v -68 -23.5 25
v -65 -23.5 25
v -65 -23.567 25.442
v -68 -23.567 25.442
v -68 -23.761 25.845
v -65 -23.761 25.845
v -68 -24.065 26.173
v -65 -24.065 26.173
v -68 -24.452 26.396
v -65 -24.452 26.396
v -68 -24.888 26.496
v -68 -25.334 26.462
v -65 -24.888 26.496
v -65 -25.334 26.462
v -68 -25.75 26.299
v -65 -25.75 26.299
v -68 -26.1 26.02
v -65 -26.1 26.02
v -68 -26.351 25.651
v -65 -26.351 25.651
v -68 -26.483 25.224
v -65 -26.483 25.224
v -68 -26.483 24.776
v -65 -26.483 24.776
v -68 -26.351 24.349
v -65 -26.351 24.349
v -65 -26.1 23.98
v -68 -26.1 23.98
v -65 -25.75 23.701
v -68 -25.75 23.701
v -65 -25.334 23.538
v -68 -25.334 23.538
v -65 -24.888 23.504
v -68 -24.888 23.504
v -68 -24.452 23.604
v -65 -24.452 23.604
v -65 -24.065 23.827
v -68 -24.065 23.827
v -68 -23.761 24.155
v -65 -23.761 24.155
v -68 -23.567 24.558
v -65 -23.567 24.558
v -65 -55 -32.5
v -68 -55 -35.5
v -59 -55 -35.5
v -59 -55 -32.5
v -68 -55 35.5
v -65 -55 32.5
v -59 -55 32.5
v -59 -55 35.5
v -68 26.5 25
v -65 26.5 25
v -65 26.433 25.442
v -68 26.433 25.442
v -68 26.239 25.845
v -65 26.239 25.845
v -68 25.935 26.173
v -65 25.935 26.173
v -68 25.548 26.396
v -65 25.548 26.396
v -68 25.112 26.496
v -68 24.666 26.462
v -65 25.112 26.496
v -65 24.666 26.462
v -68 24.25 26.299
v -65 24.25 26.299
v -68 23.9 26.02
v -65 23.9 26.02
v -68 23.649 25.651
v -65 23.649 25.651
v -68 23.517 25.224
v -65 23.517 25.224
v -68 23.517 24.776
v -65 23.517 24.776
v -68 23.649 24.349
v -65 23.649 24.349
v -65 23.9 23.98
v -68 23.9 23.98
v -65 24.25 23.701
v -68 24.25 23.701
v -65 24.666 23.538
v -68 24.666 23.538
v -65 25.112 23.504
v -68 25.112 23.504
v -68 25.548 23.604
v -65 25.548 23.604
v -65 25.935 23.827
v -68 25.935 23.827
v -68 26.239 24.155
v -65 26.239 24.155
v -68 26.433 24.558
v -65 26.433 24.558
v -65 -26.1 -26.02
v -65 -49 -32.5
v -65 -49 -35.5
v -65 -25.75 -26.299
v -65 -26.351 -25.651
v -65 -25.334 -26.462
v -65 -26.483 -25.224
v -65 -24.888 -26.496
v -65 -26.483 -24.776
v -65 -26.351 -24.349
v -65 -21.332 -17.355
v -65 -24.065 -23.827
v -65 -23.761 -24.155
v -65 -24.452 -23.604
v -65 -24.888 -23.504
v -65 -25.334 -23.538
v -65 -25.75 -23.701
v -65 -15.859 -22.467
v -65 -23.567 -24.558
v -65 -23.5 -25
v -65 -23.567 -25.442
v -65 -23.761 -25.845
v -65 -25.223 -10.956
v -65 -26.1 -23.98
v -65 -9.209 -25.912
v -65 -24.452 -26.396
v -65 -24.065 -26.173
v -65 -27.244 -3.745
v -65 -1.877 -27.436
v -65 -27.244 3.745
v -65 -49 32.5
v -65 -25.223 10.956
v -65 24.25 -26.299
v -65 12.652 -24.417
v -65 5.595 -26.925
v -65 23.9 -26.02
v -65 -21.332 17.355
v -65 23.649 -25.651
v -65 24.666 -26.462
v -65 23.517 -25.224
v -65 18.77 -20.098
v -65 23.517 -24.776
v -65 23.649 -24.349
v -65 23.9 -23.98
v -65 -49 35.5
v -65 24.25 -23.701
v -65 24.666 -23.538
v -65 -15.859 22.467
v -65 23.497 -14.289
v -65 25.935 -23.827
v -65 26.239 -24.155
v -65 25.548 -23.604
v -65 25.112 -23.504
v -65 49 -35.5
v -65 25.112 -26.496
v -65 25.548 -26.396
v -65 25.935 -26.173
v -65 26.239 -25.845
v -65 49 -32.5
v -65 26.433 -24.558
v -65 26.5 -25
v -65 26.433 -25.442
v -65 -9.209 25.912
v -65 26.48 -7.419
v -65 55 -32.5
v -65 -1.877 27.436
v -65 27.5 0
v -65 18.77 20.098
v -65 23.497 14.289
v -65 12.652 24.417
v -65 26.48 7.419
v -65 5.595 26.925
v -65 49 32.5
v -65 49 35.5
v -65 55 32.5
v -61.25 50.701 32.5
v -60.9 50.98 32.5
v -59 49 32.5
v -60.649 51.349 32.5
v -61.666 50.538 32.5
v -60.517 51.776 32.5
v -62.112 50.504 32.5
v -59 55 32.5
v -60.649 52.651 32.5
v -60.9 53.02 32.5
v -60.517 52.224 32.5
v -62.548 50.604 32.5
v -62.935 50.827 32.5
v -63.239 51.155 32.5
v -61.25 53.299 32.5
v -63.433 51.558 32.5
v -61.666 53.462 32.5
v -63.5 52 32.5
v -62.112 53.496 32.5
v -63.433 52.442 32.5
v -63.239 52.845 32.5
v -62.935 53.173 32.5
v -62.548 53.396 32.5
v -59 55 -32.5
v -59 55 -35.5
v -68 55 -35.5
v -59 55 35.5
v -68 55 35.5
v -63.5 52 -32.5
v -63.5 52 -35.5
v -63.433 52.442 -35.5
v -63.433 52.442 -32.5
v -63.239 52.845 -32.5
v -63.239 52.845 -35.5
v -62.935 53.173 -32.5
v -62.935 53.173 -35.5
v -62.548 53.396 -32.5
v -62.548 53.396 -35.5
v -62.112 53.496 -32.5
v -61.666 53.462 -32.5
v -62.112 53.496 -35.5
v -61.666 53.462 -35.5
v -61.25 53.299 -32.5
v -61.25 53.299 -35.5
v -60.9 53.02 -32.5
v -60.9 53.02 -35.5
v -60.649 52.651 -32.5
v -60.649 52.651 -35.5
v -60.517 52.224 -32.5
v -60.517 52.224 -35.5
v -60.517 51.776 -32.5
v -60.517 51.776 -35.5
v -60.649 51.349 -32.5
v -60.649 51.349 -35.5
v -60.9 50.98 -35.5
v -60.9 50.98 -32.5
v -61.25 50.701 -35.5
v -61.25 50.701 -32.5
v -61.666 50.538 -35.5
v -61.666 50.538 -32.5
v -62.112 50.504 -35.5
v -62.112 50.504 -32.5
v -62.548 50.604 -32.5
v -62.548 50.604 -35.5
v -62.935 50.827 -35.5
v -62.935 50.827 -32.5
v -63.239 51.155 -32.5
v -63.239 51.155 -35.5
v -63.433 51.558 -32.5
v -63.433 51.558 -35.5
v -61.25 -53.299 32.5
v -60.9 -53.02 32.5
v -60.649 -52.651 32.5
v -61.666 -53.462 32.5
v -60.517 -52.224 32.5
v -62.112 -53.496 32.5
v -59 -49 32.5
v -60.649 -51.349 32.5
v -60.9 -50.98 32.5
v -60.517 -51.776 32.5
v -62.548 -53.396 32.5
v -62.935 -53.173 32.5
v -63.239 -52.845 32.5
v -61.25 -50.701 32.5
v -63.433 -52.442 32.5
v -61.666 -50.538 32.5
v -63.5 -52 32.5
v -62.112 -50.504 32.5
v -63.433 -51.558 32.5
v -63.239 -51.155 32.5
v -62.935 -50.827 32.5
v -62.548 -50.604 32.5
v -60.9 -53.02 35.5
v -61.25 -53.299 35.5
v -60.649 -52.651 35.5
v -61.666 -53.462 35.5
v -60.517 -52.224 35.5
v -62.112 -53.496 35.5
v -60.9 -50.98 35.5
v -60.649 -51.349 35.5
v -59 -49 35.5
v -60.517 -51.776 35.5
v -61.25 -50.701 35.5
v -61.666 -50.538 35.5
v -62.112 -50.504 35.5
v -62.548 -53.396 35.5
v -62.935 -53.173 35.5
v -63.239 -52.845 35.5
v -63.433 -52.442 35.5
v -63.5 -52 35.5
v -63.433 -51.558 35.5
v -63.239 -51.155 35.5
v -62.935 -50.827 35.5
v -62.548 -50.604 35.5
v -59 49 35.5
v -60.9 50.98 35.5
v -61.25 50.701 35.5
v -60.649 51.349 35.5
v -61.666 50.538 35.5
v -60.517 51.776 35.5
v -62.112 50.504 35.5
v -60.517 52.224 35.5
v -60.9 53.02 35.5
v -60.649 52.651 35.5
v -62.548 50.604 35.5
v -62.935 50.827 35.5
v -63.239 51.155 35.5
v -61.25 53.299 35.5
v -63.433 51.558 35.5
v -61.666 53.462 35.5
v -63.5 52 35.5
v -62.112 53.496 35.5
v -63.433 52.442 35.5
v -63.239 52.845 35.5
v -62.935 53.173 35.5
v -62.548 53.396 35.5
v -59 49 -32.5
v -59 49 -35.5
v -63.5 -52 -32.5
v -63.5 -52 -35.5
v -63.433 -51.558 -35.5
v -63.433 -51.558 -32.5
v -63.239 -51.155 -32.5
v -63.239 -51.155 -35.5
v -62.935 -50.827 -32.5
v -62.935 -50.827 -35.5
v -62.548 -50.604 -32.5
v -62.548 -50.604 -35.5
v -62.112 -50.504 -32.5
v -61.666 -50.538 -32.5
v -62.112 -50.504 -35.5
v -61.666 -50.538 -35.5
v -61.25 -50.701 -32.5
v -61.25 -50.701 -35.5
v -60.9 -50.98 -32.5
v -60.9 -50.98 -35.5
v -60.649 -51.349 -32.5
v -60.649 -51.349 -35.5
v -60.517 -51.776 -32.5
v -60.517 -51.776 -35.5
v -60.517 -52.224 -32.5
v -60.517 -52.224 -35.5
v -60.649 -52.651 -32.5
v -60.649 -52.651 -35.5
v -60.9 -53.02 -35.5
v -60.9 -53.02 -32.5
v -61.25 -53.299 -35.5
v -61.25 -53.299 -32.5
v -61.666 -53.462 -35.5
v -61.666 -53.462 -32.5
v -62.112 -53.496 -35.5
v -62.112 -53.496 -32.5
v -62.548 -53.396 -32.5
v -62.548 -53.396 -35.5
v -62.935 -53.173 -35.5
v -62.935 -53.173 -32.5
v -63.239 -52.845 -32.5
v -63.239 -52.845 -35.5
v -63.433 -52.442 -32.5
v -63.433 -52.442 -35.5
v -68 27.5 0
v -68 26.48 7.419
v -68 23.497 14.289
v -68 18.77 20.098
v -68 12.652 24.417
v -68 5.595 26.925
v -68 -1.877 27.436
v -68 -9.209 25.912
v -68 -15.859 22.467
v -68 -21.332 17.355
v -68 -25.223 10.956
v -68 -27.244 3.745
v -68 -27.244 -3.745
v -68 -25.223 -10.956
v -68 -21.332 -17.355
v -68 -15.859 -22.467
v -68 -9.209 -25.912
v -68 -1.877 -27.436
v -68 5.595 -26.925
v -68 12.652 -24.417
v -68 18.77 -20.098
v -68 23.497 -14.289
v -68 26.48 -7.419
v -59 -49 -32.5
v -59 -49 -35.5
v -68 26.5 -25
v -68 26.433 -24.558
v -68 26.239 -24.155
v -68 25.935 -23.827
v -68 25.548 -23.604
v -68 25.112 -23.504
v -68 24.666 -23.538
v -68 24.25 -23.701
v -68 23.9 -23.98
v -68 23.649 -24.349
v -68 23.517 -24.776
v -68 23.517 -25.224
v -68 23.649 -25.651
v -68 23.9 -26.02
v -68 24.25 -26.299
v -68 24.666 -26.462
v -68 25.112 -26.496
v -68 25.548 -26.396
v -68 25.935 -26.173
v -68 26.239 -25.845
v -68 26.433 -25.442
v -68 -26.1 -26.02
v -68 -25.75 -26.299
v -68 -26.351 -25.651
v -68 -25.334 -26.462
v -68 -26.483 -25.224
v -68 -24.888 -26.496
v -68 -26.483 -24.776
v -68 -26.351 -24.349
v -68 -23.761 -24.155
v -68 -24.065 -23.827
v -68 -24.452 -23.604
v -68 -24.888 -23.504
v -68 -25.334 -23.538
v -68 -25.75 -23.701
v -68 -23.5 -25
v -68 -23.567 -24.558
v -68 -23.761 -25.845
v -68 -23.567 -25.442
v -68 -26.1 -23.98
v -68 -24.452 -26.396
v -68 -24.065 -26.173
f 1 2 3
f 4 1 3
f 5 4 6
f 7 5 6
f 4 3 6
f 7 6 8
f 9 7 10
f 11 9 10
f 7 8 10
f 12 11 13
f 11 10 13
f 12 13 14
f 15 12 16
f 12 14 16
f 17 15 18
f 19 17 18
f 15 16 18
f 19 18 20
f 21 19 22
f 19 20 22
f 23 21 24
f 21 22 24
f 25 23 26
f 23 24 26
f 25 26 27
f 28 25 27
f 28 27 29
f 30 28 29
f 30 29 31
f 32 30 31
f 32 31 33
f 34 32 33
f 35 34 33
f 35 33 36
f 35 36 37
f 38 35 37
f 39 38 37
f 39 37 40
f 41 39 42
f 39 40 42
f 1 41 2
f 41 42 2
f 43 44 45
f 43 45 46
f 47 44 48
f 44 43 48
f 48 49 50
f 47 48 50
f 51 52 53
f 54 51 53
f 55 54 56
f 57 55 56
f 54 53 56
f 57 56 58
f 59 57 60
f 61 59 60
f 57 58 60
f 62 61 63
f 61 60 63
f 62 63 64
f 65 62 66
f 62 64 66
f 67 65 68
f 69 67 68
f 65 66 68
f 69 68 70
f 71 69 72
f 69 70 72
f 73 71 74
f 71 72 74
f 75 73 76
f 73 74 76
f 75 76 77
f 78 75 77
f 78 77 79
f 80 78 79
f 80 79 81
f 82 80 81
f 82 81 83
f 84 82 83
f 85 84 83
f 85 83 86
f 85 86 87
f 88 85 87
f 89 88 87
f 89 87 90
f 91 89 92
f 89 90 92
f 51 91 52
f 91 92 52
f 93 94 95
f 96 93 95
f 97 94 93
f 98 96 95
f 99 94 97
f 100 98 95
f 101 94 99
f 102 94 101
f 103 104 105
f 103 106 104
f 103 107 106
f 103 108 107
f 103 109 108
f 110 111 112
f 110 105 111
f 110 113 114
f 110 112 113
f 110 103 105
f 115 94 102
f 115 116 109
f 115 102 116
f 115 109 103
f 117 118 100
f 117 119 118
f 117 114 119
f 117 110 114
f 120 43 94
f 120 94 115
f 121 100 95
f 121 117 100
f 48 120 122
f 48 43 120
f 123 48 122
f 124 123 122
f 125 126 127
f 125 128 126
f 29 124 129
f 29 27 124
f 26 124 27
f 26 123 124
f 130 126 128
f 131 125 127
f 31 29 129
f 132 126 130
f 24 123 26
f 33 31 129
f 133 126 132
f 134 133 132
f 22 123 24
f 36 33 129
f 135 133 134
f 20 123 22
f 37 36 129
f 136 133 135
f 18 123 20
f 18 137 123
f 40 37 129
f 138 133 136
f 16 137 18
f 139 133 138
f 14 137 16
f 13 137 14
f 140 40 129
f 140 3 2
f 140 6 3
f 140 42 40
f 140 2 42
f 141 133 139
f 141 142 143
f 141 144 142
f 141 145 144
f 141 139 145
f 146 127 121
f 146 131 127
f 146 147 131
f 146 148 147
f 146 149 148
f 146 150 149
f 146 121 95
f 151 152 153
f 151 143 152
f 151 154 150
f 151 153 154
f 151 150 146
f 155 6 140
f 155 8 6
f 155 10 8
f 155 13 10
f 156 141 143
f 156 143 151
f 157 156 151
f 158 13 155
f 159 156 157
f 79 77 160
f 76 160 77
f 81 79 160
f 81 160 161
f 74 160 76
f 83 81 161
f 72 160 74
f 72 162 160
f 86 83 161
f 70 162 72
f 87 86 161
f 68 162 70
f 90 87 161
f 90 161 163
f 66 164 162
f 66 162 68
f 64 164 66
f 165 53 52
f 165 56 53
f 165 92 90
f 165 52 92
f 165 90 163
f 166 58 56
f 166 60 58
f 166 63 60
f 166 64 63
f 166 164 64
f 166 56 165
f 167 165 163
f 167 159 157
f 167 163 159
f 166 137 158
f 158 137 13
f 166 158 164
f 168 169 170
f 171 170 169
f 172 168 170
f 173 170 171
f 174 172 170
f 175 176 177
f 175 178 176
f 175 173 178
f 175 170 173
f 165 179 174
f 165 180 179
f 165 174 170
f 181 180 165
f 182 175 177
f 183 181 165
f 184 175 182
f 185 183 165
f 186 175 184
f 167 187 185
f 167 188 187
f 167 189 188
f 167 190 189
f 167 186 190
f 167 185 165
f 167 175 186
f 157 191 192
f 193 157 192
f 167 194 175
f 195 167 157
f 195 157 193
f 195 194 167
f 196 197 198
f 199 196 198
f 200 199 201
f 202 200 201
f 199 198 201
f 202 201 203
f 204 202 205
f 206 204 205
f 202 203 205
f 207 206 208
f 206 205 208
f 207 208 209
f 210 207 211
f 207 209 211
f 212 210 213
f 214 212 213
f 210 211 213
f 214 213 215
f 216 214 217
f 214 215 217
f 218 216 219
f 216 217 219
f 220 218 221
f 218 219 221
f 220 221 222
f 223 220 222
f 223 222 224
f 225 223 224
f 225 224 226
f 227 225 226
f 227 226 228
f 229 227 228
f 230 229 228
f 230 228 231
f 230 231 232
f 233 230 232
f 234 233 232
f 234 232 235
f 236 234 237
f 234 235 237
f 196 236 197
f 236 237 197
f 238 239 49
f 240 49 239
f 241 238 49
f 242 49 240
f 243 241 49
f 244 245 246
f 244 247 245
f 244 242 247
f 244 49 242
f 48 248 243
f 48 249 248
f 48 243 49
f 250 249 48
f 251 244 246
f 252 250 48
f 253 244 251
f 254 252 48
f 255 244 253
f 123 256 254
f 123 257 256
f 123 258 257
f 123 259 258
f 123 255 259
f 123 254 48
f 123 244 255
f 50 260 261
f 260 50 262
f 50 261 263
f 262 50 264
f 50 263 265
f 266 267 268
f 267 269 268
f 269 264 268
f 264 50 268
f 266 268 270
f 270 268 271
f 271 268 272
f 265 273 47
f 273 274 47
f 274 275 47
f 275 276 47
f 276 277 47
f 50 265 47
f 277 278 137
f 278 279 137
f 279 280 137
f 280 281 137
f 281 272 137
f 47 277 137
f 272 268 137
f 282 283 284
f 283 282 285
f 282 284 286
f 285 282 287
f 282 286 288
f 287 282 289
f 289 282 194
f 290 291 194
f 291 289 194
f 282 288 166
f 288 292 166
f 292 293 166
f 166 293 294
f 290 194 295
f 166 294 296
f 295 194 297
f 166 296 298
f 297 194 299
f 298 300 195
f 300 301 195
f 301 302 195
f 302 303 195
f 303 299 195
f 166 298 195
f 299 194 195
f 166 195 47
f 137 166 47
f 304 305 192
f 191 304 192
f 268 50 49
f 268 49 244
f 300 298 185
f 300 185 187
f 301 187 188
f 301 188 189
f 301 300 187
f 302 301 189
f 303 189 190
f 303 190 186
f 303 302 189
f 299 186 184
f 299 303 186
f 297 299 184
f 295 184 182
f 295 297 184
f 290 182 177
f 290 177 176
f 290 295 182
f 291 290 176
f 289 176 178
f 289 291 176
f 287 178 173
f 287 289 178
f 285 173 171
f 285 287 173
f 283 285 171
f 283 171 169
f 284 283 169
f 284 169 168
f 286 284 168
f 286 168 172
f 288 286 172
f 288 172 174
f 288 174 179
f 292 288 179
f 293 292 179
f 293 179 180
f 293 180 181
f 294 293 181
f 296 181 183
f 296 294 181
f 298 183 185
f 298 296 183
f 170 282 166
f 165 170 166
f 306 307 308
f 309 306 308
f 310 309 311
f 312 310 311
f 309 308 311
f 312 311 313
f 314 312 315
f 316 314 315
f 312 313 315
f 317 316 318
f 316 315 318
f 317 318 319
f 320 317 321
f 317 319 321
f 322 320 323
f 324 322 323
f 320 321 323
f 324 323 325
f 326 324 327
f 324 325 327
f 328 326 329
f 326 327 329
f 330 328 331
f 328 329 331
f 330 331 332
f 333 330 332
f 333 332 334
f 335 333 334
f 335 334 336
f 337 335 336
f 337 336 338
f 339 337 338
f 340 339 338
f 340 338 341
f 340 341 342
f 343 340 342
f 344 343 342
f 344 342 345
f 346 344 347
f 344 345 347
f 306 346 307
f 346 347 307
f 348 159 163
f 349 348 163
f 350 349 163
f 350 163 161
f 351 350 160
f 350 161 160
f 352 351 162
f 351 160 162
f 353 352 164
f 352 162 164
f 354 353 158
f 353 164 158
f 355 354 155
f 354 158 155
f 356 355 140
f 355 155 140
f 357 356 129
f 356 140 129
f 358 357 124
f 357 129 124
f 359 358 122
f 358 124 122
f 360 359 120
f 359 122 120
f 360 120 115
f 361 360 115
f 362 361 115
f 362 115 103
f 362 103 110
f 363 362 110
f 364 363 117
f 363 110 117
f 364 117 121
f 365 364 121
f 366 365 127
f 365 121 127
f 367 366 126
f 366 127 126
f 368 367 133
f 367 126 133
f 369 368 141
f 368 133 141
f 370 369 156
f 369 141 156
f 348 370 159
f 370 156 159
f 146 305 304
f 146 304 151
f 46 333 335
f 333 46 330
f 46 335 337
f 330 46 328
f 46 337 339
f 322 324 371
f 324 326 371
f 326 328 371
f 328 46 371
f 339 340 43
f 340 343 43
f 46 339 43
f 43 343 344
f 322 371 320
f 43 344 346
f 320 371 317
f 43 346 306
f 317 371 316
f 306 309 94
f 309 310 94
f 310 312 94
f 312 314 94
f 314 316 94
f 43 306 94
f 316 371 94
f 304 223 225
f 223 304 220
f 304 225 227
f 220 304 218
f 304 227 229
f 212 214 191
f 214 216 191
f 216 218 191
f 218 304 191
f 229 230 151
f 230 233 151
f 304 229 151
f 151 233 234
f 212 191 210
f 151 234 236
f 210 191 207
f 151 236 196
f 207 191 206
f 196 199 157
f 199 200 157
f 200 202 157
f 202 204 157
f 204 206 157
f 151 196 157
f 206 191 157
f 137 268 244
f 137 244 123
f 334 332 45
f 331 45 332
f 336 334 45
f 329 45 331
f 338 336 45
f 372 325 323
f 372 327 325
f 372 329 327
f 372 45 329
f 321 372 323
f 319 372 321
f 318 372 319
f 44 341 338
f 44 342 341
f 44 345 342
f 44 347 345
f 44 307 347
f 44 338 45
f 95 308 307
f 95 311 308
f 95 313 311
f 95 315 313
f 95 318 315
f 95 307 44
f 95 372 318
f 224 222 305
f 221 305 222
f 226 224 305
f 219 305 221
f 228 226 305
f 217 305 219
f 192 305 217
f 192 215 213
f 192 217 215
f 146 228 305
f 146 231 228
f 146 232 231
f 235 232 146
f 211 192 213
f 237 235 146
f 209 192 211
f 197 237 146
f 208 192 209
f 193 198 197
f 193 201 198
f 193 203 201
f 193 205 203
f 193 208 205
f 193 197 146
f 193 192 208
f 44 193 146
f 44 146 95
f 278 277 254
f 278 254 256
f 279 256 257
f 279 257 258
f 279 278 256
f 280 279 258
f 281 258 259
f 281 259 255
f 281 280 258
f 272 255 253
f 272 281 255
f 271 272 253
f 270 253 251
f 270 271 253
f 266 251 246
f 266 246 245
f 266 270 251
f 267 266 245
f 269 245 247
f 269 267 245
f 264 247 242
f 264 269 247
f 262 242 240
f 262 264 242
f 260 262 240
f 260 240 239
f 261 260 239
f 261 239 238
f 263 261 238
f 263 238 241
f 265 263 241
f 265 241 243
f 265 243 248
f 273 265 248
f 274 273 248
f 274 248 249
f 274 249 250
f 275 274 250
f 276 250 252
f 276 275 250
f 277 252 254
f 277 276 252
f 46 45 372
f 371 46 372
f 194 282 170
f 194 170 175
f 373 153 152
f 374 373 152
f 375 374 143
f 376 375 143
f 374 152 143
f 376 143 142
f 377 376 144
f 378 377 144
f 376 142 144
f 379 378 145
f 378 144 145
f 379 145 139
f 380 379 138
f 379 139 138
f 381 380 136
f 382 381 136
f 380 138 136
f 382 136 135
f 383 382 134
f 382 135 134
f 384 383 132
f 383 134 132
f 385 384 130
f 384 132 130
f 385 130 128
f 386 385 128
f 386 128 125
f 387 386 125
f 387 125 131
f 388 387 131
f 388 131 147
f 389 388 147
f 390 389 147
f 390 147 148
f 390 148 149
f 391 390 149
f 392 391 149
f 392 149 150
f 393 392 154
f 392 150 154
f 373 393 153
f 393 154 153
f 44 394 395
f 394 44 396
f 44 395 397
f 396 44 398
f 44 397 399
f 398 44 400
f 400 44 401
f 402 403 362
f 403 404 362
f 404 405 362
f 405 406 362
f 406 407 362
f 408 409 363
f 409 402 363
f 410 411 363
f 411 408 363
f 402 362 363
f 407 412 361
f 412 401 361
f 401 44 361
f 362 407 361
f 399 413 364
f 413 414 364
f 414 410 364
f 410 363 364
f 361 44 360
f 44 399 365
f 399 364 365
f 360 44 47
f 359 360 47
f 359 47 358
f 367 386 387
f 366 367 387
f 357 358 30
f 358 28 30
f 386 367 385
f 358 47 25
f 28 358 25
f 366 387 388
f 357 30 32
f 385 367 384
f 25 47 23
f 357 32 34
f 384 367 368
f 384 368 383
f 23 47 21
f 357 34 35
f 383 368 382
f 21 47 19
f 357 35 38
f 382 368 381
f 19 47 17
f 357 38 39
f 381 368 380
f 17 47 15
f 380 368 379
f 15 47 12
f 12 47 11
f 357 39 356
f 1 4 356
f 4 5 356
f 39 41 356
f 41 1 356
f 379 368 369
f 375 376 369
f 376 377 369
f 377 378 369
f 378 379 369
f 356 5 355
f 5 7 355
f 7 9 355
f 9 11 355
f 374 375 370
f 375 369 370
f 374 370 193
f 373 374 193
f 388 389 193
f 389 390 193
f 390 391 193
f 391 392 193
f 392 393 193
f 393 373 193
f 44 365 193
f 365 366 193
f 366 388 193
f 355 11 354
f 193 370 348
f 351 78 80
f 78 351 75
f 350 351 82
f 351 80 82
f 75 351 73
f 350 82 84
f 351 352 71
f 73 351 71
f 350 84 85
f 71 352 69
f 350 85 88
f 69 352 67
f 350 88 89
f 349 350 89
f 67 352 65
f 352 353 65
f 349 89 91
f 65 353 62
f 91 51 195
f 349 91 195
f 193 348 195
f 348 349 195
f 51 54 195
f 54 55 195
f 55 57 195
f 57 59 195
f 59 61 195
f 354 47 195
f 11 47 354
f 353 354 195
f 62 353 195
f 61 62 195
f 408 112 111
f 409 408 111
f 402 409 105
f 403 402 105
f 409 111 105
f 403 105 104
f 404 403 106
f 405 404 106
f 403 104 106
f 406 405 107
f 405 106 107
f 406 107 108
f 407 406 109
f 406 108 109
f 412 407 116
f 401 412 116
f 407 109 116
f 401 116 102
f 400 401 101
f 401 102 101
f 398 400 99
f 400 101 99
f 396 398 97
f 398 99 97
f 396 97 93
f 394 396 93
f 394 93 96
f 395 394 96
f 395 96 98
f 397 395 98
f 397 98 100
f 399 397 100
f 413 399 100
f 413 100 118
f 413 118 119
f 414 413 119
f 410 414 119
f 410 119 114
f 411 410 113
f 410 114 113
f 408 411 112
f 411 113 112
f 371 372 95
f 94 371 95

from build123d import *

# Parameters (mm, degrees)
SKETCH004_W   = 110
SKETCH004_H   = 71
SKETCH004_R   = 1.5
SKETCH004_R_2 = 27.5
PAD001_DEPTH  = 3
SKETCH005_W   = 6
SKETCH005_H   = 6
SKETCH005_R   = 1.5
PAD002_DEPTH  = 3


with BuildPart() as coverplane:
    # Sketch004 → Pad001 (new body)
    with BuildSketch(Plane.YZ):
        Rectangle(SKETCH004_W, SKETCH004_H)
        with Locations((25, 25)):
            Circle(SKETCH004_R, mode=Mode.SUBTRACT)
        with Locations((-25, 25)):
            Circle(SKETCH004_R, mode=Mode.SUBTRACT)
        with Locations((25, -25)):
            Circle(SKETCH004_R, mode=Mode.SUBTRACT)
        with Locations((-25, -25)):
            Circle(SKETCH004_R, mode=Mode.SUBTRACT)
        Circle(SKETCH004_R_2, mode=Mode.SUBTRACT)
    extrude(amount=PAD001_DEPTH)

    # Sketch005 → Pad002 (join)
    with BuildSketch(Plane.XY.offset(-35.5)):
        with Locations((-3, 52)):
            Rectangle(SKETCH005_W, SKETCH005_H)
        with Locations((-3, 52)):
            Circle(SKETCH005_R, mode=Mode.SUBTRACT)
        with Locations((-3, -52)):
            Rectangle(SKETCH005_W, SKETCH005_H)
        with Locations((-3, -52)):
            Circle(SKETCH005_R, mode=Mode.SUBTRACT)
    pad002 = extrude(amount=PAD002_DEPTH)

    # Mirrored: Pad002 across XY
    add(pad002.mirror(Plane.XY))


with BuildPart() as part_mirroring:
    # Part__Mirroring: instance of coverplane
    add(coverplane.part.mirror(Plane(origin=(-32.5, 0, 0), x_dir=(0, -1, 0), z_dir=(1, 0, 0))))


solid = part_mirroring.part
